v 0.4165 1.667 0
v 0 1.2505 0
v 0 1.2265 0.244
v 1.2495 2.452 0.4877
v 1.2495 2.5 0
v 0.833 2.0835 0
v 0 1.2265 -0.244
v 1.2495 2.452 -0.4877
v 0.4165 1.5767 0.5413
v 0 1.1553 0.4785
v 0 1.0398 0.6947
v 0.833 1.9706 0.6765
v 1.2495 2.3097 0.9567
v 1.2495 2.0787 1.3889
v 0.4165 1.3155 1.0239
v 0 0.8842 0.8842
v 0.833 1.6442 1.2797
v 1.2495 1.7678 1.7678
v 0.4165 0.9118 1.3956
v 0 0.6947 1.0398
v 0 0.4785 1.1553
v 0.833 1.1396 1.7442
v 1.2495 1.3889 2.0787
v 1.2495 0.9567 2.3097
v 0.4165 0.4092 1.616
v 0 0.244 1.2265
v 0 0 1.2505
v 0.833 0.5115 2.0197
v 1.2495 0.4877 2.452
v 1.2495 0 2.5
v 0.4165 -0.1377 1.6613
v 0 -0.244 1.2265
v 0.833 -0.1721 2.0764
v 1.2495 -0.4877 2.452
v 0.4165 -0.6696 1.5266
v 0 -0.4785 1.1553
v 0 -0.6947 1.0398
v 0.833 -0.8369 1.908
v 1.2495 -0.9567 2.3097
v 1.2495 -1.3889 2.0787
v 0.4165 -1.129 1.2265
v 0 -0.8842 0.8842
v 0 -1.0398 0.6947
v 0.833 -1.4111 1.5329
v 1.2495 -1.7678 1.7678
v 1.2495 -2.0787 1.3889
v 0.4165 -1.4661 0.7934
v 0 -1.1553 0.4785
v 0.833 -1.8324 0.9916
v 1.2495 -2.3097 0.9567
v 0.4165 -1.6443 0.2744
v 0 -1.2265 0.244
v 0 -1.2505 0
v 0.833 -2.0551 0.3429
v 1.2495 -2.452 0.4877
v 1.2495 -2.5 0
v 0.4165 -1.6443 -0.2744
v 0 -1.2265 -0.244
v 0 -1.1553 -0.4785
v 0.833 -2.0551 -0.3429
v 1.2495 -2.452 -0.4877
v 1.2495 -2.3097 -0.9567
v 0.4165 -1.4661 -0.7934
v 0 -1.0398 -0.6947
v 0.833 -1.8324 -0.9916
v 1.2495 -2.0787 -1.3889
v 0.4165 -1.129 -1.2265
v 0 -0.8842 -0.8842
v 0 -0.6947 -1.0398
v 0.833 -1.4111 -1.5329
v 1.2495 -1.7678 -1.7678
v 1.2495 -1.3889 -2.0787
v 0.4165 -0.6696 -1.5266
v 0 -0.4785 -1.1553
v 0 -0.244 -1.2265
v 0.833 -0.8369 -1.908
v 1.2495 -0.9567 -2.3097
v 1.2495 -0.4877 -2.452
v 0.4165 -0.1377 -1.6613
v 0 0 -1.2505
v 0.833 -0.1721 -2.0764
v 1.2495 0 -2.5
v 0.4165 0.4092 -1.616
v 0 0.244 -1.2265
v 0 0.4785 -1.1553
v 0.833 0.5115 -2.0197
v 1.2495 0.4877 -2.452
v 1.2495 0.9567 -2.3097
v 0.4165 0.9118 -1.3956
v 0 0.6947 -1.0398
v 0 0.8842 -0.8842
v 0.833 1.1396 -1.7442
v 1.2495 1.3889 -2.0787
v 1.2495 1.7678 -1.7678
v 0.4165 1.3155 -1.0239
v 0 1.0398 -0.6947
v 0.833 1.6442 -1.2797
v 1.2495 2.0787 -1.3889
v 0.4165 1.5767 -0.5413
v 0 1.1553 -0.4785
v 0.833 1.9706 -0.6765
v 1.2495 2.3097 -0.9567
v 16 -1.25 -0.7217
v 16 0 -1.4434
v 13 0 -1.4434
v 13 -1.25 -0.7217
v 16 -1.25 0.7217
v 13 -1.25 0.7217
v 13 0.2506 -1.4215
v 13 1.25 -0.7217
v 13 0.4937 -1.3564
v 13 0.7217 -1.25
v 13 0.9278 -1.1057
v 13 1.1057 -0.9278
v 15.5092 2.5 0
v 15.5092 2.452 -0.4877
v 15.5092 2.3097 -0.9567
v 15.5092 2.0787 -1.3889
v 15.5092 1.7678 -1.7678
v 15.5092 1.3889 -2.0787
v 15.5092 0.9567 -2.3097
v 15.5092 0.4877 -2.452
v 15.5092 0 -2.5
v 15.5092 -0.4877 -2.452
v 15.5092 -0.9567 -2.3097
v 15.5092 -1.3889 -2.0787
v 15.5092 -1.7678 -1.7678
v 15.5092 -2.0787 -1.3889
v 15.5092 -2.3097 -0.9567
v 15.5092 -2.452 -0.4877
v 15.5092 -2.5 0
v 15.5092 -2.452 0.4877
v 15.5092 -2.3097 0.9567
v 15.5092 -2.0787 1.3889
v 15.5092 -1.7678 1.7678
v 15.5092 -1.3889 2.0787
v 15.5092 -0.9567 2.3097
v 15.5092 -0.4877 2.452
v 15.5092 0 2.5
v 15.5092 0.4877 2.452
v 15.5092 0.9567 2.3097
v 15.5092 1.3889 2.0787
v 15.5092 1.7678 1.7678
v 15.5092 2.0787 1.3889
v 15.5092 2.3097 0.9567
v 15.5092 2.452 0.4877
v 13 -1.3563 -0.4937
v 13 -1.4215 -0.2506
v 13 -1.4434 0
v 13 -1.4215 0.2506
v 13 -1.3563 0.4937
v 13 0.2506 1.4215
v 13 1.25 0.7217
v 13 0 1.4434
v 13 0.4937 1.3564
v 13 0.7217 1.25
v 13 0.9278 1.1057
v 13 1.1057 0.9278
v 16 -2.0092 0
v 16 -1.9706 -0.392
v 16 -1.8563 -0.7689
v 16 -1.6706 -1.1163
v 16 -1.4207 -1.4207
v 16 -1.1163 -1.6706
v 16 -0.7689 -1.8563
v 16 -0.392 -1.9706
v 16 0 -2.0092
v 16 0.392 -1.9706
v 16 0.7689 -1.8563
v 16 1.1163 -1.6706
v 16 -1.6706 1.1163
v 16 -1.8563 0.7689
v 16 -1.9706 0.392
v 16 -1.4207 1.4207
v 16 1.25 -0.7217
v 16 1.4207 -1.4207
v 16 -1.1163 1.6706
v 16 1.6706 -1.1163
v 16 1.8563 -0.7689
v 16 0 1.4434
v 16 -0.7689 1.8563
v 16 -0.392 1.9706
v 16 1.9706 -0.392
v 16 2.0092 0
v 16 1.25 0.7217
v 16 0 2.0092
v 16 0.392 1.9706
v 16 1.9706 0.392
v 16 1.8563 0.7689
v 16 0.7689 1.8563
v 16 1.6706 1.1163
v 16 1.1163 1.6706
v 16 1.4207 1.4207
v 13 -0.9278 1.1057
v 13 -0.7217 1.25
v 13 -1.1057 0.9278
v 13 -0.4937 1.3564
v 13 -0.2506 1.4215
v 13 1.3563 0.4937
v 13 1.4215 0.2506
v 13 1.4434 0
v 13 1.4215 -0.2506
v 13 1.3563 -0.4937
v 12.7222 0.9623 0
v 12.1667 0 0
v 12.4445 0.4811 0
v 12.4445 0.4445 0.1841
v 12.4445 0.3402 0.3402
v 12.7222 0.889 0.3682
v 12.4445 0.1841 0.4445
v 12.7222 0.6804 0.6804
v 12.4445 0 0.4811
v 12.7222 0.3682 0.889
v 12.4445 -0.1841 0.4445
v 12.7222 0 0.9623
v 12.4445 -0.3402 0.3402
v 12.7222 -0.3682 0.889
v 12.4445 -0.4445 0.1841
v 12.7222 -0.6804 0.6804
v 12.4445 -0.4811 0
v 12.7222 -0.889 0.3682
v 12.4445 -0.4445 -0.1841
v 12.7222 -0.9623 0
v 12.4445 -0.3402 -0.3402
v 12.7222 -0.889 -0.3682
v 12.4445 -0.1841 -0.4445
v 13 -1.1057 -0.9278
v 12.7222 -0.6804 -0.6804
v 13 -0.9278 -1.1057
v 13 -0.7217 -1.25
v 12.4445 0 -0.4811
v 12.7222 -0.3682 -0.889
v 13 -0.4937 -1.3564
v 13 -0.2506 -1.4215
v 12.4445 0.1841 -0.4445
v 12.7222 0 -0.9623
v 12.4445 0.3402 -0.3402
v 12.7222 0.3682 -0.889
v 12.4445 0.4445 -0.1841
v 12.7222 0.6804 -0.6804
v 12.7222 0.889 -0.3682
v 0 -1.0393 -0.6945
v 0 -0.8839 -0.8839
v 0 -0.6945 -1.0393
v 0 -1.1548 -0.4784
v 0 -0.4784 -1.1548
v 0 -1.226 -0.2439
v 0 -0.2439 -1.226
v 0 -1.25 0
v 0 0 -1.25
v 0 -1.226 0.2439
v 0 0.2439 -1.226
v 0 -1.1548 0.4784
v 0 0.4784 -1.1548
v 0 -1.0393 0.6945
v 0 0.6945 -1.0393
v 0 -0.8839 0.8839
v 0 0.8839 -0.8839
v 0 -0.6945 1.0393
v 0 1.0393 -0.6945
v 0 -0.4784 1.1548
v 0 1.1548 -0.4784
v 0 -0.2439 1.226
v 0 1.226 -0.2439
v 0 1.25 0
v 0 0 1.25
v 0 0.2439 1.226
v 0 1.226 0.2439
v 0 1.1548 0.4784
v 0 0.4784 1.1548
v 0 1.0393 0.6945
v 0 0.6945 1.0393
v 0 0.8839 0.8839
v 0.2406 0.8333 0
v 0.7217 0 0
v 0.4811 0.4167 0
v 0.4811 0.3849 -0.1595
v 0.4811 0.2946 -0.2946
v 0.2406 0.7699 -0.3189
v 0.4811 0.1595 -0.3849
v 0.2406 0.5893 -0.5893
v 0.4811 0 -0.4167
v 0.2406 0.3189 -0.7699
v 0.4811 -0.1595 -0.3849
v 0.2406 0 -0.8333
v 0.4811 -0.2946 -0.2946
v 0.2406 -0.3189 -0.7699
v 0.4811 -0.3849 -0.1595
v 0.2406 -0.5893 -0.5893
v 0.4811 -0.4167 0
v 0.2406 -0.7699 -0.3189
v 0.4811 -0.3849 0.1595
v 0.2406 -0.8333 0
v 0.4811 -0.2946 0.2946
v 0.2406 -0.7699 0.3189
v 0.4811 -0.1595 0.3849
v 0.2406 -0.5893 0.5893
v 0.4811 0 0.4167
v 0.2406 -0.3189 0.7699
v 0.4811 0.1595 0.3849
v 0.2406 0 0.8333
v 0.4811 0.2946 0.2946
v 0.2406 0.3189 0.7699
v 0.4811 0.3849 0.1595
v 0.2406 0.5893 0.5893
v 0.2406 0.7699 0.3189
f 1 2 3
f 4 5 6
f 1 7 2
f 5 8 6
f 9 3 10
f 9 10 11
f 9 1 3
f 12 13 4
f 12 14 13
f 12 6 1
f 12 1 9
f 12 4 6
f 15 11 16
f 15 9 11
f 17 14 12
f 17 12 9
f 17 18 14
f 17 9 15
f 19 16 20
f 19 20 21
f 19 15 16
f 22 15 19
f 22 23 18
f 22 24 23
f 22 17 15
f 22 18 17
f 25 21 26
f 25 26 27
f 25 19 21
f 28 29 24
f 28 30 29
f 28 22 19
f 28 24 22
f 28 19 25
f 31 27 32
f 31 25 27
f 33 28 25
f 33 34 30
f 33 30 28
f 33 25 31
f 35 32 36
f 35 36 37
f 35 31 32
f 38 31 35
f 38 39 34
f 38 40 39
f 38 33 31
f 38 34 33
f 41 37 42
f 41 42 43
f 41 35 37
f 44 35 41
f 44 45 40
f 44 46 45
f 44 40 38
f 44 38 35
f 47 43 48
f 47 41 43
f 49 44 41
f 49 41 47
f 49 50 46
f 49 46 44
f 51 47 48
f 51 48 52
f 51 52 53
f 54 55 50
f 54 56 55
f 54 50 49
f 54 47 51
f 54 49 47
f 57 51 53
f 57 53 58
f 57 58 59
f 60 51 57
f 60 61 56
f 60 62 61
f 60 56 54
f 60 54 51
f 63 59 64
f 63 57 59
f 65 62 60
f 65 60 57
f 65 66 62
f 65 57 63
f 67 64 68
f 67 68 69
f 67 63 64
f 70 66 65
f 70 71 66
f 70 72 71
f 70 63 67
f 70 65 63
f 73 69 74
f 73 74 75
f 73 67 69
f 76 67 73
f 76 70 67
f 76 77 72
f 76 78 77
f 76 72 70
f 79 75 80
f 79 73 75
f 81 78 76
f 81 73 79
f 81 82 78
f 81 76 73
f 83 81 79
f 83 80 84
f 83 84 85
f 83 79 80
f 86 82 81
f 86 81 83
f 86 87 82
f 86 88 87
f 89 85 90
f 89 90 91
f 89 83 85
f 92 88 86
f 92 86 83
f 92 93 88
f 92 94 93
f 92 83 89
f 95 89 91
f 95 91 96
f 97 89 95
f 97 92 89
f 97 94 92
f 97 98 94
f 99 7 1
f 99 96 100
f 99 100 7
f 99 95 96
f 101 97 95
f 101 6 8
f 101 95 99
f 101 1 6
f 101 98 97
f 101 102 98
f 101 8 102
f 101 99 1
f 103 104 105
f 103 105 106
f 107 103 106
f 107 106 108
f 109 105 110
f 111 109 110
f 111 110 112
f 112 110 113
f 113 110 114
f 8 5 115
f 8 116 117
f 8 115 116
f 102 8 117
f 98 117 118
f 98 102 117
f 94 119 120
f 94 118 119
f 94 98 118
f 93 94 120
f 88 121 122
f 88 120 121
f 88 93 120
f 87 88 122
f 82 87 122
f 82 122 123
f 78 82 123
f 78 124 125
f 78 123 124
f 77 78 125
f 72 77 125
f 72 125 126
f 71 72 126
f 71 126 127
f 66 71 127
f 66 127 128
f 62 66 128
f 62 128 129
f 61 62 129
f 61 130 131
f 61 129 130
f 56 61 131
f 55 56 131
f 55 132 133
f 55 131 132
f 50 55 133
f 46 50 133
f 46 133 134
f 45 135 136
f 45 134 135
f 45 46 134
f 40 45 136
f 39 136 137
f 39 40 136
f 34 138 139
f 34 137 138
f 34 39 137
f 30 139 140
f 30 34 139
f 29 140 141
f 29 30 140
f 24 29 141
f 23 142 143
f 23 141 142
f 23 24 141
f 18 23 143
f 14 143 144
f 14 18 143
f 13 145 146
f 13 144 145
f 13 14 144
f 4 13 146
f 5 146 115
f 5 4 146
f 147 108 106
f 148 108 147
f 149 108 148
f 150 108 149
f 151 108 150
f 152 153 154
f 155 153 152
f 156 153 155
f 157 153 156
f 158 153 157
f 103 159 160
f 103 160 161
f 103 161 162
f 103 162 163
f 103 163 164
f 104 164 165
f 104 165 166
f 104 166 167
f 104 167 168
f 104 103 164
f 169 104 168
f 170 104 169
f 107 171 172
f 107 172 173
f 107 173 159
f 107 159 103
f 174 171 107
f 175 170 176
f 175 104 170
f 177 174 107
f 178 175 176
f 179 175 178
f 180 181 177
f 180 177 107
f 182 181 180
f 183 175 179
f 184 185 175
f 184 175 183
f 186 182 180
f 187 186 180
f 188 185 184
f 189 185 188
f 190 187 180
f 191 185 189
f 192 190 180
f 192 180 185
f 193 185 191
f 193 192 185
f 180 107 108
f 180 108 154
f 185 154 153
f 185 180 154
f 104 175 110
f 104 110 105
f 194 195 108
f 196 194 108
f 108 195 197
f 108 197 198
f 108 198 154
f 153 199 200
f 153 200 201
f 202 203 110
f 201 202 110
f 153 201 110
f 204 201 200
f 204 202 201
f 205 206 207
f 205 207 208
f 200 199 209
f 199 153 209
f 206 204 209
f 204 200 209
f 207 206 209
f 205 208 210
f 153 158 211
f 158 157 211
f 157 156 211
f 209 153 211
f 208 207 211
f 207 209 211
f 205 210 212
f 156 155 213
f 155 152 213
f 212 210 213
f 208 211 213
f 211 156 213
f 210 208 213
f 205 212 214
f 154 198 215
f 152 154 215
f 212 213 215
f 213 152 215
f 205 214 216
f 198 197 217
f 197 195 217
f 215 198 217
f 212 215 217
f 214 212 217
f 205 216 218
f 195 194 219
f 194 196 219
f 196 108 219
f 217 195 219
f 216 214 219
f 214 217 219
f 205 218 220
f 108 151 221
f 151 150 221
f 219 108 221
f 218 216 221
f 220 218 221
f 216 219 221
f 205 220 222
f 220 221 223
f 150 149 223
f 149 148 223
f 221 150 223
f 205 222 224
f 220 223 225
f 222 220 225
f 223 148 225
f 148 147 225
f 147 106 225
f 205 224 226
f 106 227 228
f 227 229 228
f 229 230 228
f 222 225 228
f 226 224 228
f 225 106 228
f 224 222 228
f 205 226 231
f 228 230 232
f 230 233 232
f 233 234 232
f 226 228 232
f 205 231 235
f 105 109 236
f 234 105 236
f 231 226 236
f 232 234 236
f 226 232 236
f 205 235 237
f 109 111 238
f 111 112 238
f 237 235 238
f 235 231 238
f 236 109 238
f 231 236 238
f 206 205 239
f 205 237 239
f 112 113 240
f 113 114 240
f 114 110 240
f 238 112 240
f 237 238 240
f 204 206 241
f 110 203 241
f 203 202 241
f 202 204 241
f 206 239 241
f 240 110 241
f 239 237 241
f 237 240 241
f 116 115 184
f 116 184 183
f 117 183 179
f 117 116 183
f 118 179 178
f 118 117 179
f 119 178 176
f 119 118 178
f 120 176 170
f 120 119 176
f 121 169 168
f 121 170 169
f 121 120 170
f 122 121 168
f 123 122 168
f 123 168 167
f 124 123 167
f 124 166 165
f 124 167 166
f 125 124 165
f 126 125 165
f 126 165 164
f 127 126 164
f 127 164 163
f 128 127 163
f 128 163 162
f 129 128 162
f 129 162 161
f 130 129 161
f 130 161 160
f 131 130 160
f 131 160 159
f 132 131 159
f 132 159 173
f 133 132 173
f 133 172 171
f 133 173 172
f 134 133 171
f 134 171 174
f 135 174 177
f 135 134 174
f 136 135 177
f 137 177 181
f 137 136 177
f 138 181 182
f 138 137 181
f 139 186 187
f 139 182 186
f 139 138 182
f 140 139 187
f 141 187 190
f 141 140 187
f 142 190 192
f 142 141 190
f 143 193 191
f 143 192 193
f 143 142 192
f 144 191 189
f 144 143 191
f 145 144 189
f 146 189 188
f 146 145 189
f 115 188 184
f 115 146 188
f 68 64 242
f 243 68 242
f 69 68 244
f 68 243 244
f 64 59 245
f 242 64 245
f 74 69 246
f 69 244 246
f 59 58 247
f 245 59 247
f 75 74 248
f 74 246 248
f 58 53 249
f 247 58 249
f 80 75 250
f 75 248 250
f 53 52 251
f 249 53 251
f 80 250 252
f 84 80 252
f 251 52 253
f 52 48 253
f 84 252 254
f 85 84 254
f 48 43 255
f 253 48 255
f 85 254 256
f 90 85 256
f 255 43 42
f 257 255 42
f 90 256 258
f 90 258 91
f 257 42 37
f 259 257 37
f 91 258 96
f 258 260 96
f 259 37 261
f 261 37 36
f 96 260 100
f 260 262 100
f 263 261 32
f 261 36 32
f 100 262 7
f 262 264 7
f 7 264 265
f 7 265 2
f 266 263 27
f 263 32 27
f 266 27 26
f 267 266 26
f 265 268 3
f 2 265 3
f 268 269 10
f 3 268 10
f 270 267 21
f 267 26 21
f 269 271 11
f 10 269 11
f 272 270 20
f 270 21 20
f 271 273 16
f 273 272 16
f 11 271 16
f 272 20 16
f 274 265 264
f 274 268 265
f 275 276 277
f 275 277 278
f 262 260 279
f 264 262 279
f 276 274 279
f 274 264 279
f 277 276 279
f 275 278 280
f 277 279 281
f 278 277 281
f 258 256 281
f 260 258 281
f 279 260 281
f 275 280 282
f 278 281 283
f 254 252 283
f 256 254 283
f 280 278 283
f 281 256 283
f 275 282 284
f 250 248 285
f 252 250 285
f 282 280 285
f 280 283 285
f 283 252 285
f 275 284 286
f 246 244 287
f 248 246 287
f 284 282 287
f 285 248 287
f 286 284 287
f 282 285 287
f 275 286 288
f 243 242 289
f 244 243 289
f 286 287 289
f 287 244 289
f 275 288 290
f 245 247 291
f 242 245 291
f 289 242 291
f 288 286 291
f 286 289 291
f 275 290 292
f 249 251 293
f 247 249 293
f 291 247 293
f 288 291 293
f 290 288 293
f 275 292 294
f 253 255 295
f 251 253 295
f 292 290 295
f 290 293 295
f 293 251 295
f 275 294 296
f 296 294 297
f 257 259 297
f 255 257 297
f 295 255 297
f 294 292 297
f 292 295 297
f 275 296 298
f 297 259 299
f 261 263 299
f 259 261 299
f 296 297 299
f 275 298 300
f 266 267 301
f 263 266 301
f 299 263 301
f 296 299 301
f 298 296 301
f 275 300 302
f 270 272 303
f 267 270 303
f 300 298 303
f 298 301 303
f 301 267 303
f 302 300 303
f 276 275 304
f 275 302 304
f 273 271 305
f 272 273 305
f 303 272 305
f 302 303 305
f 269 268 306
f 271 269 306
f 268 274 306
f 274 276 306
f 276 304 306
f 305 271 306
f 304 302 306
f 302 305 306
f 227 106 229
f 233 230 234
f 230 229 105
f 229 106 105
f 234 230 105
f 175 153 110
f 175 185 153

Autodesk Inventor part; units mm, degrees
ref_plane "YZ Plane" through (0, 0, 0) normal (1, 0, 0) x (0, 1, 0)
ref_plane "XZ Plane" through (0, 0, 0) normal (0, 1, 0) x (-1, 0, 0)
sketch "Skizze1" plane through (0, 0, 0) normal (0, 0, 1) x (1, 0, 0)
  line L0 (0.7217, 0) -> (12.1667, 0)
  line L1 (16, 1.4434) -> (16, 2.5)
  line L2 (16, 2.5) -> (0, 2.5)
  line L3 (16, 1.4434) -> (13, 1.4434)
  line L4 (13, 1.4434) -> (12.1667, 0)
  line L5 (0, 1.25) -> (0.7217, 0)
  line L6 (0, -0.5) -> (0, 3) projected
  line L7 (0, 1.25) -> (0, 2.5)
  point P0 (0, 0)
  dimension "d0" = 3
  dimension "d1" = 60
  dimension "d2" = 5
  dimension "d3" = 2.8868
  dimension "d4" = 16
  dimension "d5" = 60
  dimension "d7" = 2.5
revolve "Körper" add sketch "Skizze1" angle 360 about axis through (0.7217, 0, 0) along (1, 0, 0)
sketch "Skizze2" plane through (16, 0, 0) normal (1, 0, 0) x (0, 0, -1)
  circle A0 centre (0, 0) radius 1.4434 projected
  circle A1 centre (0, 0) radius 2.5 projected
  line L0 (1.4434, 0) -> (0.7217, -1.25)
  line L1 (0.7217, -1.25) -> (-0.7217, -1.25)
  line L2 (-0.7217, -1.25) -> (-1.4434, 0)
  line L3 (-1.4434, 0) -> (-0.7217, 1.25)
  line L4 (-0.7217, 1.25) -> (0.7217, 1.25)
  line L5 (0.7217, 1.25) -> (1.4434, 0)
extrude "Loch" add sketch "Skizze2" against normal blind 3 contours L5 A0 | A0 L0 | L4 A0 | A0 L1 | L3 A0 | A0 L2
chamfer "Fase1" distance 1.25 angle 45 1 edges at (0, -2.5, 0) measured on face at (0, 2.0591, -0.1994)
thread "Gewinde" size "M5x0.8" class "6g" standard "ISO Metric profile" length 16
chamfer "Fase2" distance 0.4908 angle 45 1 edges at (16, -2.5, 0) measured on face at (11.0832, 2.4676, -0.401)
ref_plane "Work Plane1" through (8, 0, 0) normal (0, -0.5, -0.866) x (1, 0, 0)
equation "\"d0\" = INTI"
equation "\"d2\" = NND"
equation "\"d3\" = 1.1547 * SW"
equation "\"d4\" = NLG"
equation "\"d5\" = 0.5 * ANG"
equation "\"d7\" = SPD"
equation "\"d8\" = INTI"
equation "\"d10\" = -0.5 * SPD + 0.5 * NND"
equation "\"d11\" = FAWI"
equation "\"d33\" = -0.5 * SPD + 0.5 * NND"
equation "\"d14\" = NLG"
equation "\"d12\" = -0.5 * GD1 + 0.5 * NND"
equation "\"d13\" = FAWI"
equation "\"d34\" = -0.5 * GD1 + 0.5 * NND"
equation "\"NND\" = 5"
equation "\"NLG\" = 16"
equation "\"INTI\" = 3"
equation "\"FAWI\" = 45deg"
equation "\"SW\" = 2.5"
equation "\"GD1\" = THREADDIA - 1.2269 * PTC"
equation "\"ANG\" = 120deg"
equation "\"FAWI1\" = 45deg"
equation "\"SPD\" = 2.5"
equation "\"GUL\" = 0.61345 * PTC"
equation "\"TOA\" = 30deg"
equation "\"THREADDIA\" = 5"
equation "\"PTC\" = 0.8"
equation "\"GAL\" = 0.61345 * PTC"
equation "\"E0\" = 1.155 * SW"
properties part number "ISO 4029 - M5 x 16" material "Edelstahl, 440C"
